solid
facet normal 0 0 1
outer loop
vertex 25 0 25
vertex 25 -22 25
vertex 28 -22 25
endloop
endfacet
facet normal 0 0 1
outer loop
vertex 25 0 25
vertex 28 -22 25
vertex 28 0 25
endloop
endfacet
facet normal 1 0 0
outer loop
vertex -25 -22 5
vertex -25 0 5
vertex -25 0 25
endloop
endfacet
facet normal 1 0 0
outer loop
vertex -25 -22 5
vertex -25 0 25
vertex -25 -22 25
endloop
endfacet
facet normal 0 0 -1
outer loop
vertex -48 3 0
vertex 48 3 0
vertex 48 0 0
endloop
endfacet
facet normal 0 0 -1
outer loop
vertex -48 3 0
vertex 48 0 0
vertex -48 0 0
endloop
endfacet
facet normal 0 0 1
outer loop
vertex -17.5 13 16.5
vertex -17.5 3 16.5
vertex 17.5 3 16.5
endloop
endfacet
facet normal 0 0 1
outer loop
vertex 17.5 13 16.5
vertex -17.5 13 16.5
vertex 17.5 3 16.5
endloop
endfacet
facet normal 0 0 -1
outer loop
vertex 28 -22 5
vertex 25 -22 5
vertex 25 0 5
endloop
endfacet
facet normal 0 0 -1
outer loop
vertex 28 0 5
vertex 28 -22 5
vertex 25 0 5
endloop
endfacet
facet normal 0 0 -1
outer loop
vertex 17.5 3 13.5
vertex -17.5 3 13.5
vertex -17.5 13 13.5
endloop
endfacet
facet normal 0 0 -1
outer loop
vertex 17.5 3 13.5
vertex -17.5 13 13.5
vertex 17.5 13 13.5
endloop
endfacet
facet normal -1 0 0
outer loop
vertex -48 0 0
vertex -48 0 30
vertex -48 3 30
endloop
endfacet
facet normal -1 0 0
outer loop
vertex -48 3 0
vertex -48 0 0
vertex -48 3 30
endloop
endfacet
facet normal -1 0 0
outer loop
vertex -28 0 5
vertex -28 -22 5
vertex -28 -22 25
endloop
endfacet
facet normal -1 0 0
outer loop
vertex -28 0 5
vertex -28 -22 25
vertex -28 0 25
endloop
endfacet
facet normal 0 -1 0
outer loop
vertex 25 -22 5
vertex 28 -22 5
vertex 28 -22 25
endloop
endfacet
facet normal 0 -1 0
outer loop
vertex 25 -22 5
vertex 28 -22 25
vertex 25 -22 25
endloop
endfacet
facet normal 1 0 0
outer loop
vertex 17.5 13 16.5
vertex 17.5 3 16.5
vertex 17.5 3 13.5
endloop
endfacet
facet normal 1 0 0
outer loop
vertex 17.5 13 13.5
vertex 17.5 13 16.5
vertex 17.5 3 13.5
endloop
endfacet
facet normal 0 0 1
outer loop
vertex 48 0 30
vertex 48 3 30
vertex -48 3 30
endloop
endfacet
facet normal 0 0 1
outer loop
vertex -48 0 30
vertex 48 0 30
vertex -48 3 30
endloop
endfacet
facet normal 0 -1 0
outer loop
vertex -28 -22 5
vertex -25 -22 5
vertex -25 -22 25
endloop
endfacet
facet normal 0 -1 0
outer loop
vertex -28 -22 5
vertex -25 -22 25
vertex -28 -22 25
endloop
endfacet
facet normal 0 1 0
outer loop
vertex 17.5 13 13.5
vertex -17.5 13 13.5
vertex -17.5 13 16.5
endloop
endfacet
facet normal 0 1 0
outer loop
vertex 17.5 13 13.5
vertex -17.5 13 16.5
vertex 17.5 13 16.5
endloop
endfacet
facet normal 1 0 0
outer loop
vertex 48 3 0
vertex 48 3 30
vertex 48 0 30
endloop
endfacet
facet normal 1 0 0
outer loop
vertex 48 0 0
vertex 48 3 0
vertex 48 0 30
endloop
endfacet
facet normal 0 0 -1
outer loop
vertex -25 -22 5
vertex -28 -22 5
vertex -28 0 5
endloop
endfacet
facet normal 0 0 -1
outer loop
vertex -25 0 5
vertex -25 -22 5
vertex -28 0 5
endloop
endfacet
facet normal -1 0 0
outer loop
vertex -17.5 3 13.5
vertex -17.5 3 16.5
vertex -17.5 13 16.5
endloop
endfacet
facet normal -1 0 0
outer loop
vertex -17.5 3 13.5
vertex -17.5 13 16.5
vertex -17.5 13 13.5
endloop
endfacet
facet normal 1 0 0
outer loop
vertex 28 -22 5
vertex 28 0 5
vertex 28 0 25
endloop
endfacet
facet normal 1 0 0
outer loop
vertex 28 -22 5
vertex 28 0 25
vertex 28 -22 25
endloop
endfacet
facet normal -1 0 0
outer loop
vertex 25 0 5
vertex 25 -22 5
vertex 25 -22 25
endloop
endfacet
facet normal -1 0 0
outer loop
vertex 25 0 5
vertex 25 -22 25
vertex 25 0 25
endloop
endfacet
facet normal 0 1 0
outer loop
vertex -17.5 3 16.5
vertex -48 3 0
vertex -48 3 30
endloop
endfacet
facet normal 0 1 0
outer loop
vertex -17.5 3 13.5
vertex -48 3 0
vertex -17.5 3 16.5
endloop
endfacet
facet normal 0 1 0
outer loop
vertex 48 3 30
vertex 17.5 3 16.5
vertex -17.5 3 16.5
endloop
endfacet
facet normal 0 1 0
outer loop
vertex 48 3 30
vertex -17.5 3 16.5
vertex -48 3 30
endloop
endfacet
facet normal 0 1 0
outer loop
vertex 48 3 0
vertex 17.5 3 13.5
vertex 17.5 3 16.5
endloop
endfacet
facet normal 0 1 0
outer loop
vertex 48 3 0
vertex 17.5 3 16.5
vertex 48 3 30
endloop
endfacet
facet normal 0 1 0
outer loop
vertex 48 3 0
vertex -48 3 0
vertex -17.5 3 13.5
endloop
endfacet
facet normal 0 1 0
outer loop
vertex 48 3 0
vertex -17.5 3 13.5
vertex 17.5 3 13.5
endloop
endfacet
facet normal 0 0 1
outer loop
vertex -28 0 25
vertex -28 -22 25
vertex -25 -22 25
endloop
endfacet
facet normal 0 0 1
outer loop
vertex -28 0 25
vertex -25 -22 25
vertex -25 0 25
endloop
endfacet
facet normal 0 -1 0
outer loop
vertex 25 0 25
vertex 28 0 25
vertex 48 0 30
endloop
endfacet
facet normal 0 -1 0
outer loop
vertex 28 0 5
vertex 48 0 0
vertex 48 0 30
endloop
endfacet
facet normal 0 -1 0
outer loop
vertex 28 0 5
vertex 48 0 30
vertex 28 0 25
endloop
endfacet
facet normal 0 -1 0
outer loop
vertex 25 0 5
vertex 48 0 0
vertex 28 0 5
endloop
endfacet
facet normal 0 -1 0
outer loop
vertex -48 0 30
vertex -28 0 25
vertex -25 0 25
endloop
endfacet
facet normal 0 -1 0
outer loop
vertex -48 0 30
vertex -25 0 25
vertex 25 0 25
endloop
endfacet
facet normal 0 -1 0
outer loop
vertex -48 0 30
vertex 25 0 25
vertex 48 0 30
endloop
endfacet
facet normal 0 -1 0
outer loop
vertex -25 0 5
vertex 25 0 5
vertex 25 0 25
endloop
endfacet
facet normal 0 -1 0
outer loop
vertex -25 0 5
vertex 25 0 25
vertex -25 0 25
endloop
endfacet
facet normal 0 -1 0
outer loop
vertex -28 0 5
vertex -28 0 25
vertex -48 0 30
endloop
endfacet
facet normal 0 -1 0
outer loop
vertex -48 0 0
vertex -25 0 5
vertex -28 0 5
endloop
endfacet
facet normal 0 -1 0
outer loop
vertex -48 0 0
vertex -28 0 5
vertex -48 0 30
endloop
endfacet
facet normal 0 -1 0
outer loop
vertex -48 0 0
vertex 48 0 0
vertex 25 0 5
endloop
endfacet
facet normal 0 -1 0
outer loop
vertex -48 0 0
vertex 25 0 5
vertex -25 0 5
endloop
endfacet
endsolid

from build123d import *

# Parameters (mm, degrees)
BOSS_EXTRUDE1_DEPTH = 30
SKETCH2_W           = 5
SKETCH2_H           = 22
CUT_EXTRUDE1_DEPTH  = 77
SKETCH3_W           = 35
SKETCH3_H           = 3
BOSS_EXTRUDE2_DEPTH = 10


with BuildPart() as part:
    # Sketch1 → Boss-Extrude1 (new body)
    with BuildSketch(Plane.XY):
        Polygon((-48, 3), (48, 3), (48, 0), (28, 0), (28, -22), (25, -22), (25, 0), (-25, 0), (-25, -22), (-28, -22), (-28, 0), (-48, 0), align=None)
    extrude(amount=BOSS_EXTRUDE1_DEPTH)

    # Sketch2 → Cut-Extrude1 (cut, through all)
    with BuildSketch(Plane.ZY.offset(28)):
        with Locations((2.5, -11)):
            Rectangle(SKETCH2_W, SKETCH2_H)
        with Locations((27.5, -11)):
            Rectangle(SKETCH2_W, SKETCH2_H)
    extrude(amount=-CUT_EXTRUDE1_DEPTH, mode=Mode.SUBTRACT)

    # Sketch3 → Boss-Extrude2 (add)
    with BuildSketch(Plane(origin=(0, 3, 0), x_dir=(1, 0, 0), z_dir=(0, 1, 0))):
        with Locations((0, -15)):
            Rectangle(SKETCH3_W, SKETCH3_H)
    extrude(amount=BOSS_EXTRUDE2_DEPTH)


solid = part.part
